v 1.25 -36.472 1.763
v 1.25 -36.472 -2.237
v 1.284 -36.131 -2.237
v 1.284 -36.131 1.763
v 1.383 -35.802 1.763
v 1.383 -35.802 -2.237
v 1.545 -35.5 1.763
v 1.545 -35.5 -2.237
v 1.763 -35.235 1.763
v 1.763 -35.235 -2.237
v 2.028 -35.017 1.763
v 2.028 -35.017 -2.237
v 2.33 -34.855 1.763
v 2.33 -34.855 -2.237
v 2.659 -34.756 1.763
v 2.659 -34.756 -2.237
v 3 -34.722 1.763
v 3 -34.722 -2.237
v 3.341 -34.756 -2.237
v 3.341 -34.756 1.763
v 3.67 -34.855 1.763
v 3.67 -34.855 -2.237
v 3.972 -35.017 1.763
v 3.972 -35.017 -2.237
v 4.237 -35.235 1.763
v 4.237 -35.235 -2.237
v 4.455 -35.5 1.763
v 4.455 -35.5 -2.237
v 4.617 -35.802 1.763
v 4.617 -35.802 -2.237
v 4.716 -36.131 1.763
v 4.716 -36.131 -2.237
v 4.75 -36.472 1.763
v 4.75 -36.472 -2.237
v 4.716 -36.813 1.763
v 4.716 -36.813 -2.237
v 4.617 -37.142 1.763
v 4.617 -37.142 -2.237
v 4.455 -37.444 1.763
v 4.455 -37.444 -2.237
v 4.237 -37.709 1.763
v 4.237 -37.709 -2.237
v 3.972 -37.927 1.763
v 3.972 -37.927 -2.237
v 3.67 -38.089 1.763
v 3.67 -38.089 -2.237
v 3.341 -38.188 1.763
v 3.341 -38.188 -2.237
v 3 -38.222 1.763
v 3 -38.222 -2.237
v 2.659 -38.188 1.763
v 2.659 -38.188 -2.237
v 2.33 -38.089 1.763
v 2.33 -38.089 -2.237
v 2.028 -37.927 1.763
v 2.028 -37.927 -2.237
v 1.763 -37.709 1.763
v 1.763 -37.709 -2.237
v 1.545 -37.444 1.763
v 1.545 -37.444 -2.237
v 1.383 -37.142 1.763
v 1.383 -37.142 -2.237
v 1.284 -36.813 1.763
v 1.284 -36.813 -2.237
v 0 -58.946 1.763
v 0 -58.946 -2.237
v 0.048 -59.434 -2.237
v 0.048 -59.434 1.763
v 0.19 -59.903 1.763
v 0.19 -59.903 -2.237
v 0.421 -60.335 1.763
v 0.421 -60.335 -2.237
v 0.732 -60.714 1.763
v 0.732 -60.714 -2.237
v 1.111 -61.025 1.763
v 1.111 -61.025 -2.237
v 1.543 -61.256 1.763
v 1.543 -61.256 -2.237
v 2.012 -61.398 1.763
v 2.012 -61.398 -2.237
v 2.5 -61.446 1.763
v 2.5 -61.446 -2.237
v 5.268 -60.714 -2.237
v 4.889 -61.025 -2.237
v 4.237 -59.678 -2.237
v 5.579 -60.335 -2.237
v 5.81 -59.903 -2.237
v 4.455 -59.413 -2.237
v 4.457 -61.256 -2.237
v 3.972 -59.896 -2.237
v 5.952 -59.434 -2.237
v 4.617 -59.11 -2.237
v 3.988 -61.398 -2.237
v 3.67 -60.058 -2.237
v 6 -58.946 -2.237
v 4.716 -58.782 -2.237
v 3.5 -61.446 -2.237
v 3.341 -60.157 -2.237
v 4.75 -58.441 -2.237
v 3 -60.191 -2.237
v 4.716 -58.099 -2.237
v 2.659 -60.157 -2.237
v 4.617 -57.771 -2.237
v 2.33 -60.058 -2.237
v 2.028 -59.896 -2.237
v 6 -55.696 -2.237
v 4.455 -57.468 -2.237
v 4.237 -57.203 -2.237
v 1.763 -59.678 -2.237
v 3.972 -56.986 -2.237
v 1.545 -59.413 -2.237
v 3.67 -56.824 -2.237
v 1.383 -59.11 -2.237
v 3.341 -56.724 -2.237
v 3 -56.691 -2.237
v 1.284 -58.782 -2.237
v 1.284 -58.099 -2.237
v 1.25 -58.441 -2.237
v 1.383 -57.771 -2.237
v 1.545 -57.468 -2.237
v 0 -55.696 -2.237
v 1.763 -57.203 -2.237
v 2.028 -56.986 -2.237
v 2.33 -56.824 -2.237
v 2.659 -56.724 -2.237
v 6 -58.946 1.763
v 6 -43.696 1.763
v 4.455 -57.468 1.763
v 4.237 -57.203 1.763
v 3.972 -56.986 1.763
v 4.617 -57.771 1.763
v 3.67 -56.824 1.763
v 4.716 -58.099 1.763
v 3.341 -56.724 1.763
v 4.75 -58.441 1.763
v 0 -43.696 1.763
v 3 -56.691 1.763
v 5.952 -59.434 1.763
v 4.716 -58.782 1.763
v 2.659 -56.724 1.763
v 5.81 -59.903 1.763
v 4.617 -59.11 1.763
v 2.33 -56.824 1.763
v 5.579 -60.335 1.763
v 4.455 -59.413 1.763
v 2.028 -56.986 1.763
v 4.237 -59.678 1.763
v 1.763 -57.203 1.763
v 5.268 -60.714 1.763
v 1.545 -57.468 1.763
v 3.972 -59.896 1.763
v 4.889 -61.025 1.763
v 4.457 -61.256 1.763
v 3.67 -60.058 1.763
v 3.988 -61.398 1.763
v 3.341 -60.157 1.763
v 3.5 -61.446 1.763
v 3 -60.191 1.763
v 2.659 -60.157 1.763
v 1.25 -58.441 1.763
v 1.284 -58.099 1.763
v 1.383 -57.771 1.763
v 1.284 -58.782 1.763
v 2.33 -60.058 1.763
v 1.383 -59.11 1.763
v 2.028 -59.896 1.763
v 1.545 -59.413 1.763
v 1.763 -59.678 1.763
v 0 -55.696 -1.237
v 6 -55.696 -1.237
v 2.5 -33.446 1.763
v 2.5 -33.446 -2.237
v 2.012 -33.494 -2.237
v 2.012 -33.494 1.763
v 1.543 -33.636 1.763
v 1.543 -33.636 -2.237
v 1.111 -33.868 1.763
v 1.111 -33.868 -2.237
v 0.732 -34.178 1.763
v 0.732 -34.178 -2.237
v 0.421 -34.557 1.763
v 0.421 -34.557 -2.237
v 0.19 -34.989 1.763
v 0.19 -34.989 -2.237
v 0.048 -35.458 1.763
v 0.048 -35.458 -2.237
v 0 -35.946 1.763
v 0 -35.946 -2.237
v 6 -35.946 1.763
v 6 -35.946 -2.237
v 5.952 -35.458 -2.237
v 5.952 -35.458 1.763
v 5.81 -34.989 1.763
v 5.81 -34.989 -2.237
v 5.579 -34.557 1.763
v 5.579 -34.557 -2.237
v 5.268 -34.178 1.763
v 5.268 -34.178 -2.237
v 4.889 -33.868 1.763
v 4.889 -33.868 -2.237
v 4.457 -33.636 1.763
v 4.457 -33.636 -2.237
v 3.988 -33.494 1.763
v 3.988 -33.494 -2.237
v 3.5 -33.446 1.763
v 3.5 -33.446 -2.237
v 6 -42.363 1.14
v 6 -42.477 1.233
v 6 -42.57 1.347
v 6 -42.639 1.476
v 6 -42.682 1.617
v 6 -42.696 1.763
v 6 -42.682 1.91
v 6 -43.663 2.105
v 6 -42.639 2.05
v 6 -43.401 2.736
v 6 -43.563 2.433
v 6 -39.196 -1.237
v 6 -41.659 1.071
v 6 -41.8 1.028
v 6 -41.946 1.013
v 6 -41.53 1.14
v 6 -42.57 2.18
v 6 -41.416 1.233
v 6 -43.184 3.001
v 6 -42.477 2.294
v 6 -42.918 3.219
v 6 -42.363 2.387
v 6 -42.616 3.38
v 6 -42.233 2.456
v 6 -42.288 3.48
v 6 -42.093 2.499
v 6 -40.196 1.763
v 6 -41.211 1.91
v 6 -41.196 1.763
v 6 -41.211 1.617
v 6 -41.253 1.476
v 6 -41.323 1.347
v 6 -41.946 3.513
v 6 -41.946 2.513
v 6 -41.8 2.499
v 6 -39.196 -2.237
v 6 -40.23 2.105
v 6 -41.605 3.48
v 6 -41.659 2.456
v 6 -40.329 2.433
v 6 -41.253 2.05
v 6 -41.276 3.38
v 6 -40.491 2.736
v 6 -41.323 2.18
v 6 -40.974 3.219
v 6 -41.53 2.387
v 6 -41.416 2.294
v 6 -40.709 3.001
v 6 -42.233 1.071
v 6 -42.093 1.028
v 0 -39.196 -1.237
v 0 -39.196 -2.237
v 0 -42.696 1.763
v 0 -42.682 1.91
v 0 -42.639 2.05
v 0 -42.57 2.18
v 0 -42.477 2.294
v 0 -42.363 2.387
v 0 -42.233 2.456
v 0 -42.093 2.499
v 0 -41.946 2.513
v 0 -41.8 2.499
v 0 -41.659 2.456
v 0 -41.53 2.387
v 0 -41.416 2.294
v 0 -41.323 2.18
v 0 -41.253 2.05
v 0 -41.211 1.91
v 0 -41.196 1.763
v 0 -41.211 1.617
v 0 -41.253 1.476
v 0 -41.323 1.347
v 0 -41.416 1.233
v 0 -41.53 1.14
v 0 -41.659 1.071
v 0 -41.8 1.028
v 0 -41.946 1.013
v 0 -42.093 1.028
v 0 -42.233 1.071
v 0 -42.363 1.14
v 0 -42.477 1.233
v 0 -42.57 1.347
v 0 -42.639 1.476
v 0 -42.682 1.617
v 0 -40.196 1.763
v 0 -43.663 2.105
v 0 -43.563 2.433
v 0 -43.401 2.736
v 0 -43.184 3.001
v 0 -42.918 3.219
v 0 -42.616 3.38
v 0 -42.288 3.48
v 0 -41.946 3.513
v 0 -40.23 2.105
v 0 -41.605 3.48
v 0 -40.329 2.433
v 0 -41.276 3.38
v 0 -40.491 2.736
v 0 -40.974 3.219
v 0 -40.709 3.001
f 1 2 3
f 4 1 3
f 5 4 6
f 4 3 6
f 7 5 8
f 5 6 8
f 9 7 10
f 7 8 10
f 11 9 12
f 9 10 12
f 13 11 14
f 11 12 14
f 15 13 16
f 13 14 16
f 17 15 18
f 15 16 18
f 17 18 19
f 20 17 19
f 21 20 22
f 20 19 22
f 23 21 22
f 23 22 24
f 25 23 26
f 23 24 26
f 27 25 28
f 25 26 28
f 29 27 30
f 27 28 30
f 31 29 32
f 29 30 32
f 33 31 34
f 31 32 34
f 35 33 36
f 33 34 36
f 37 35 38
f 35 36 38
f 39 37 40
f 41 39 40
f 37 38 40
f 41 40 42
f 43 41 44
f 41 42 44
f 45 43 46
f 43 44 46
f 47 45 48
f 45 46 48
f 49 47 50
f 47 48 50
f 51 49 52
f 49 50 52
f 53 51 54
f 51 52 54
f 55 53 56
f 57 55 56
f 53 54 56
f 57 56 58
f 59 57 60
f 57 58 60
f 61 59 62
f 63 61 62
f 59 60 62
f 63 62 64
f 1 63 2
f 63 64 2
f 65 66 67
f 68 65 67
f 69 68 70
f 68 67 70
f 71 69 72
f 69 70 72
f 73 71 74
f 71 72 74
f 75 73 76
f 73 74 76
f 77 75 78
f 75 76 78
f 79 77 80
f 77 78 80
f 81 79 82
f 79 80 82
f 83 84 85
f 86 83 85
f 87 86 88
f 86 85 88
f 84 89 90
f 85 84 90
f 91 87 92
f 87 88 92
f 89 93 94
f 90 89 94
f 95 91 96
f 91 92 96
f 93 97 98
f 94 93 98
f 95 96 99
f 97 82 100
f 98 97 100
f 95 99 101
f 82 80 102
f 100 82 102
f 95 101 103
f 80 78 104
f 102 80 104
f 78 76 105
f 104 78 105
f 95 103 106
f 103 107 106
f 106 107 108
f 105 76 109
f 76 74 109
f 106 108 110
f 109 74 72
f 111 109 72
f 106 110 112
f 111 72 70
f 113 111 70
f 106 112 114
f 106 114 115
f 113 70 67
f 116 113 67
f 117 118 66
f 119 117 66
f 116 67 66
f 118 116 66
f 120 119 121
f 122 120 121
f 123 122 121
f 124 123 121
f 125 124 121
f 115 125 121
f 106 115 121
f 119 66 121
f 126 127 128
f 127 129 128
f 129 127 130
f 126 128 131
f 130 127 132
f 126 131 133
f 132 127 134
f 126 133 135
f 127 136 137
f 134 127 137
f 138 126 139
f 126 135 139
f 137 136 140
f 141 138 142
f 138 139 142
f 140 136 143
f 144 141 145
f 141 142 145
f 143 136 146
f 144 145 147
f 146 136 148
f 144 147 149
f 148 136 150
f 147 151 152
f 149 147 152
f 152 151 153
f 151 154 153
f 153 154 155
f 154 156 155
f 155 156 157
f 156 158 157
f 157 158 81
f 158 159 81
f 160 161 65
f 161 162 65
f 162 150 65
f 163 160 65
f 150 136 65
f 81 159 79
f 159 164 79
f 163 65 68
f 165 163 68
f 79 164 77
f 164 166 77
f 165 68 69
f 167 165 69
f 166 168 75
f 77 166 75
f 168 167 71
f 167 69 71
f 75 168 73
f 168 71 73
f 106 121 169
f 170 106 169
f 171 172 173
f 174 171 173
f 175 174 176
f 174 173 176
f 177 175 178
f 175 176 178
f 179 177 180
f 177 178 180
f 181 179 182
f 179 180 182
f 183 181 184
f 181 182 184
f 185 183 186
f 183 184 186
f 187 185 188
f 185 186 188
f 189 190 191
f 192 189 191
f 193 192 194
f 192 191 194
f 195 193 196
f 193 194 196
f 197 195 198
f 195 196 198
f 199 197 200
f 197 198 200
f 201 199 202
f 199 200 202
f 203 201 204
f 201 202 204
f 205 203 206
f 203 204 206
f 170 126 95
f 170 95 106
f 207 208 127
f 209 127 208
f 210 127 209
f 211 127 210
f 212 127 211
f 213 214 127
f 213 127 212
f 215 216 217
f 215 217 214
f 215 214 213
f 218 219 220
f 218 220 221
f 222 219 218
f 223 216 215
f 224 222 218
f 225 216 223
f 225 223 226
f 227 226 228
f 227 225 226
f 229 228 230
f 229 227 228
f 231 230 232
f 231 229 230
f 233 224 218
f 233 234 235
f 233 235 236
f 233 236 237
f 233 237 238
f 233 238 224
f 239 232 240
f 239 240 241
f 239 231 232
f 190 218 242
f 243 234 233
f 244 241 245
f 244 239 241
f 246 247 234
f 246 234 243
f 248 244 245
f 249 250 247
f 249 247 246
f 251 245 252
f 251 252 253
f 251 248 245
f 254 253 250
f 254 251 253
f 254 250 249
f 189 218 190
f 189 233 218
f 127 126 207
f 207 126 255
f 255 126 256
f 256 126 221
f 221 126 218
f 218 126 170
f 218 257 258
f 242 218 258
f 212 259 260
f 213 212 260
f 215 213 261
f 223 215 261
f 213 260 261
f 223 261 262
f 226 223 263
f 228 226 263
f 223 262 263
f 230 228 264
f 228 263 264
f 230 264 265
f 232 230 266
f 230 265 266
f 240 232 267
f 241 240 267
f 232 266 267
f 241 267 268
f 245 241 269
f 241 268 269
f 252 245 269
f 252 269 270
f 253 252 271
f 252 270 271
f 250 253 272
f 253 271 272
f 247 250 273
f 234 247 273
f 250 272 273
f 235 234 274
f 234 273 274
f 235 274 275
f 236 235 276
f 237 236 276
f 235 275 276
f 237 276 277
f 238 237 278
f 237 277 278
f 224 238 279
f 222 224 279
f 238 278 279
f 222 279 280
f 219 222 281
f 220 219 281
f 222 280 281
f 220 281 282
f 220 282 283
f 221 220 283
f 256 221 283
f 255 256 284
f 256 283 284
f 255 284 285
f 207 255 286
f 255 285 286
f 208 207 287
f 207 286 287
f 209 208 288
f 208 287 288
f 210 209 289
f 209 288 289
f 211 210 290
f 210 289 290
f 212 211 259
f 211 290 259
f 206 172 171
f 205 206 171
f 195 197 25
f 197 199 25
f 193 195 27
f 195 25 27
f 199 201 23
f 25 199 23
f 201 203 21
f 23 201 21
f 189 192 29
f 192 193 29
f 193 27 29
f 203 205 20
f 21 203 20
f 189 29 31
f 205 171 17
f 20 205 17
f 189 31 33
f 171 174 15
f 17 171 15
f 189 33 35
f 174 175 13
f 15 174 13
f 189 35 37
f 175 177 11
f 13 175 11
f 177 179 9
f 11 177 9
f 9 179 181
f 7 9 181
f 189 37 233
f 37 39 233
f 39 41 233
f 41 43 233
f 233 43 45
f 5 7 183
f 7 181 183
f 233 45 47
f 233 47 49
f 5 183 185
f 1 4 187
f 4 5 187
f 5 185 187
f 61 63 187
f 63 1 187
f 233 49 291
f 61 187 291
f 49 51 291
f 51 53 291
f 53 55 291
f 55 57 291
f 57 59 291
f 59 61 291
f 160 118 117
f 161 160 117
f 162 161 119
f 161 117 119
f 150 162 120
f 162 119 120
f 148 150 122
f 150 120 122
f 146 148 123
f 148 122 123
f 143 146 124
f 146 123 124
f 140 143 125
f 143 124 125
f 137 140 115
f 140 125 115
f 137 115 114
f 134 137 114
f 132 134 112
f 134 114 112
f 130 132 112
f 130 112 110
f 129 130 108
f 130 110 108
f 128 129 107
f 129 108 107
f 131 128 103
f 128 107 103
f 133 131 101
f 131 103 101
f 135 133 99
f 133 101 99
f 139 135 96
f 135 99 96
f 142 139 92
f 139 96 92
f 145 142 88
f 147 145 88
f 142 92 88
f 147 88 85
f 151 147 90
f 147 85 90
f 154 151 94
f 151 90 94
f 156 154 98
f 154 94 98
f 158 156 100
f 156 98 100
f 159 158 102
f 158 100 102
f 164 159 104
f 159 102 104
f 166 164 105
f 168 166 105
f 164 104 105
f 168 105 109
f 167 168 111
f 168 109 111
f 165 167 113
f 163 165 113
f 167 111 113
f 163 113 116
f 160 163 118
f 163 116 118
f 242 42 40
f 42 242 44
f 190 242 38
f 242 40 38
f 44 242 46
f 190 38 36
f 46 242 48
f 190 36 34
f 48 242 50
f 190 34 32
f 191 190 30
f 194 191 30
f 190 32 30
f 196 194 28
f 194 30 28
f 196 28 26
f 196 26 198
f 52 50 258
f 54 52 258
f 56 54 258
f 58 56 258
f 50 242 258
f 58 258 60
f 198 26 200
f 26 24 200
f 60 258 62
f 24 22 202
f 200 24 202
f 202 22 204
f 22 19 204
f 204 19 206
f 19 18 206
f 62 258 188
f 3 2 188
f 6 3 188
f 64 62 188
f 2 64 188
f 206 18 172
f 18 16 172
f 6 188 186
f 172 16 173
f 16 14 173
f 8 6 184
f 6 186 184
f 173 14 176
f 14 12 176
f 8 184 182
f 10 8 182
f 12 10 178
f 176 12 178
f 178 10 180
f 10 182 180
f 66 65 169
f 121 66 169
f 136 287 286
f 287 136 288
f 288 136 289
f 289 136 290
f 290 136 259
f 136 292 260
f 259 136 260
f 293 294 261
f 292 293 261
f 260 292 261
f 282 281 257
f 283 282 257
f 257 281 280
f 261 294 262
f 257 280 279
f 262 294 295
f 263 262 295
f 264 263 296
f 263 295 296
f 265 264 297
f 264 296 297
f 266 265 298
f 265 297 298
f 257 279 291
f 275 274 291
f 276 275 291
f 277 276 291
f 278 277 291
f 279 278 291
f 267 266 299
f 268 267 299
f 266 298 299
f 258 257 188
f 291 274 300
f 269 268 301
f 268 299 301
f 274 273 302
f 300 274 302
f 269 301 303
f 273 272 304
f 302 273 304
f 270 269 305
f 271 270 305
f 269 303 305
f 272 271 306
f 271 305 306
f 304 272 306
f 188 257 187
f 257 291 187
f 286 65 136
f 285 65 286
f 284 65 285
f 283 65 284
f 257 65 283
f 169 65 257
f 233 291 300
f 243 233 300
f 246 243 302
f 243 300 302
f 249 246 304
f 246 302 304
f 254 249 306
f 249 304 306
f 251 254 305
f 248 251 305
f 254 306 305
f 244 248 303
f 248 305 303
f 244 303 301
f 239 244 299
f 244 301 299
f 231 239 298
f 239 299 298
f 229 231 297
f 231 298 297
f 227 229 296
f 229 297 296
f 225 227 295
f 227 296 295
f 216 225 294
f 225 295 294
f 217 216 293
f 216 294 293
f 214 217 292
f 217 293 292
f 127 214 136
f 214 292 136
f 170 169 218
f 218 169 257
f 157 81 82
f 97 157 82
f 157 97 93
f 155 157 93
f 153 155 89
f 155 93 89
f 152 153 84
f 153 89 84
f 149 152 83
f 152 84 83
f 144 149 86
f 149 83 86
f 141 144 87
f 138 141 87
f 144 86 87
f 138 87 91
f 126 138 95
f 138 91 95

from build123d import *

# Parameters (mm, degrees)
F0_W     = 1.25
F0_H     = 4
F0_W_2   = 1.75
F1_DEPTH = 6
F4_DEPTH = 4
F5_DEPTH = 4
F6_DEPTH = 4


# Not quite as in the source:
# - a feature names something its author has since deleted; it is built from what else it names


with BuildPart() as f1:
    # F0 (on Right) → F1 (new body)
    with BuildSketch(Plane.YZ):
        with Locations((-34.0711950026, -0.2365471814)):
            Rectangle(F0_W, F0_H)
        with Locations((-35.5711950026, -0.2365471814)):
            Rectangle(F0_W_2, F0_H)
        with BuildLine():
            Line((-38.1961950026, -2.2365471814), (-36.4461950026, -2.2365471814))
            Line((-36.4461950026, -2.2365471814), (-36.4461950026, 1.7634528186))
            Line((-36.4461950026, 1.7634528186), (-38.1961950026, 1.7634528186))
            Line((-38.1961950026, 1.7634528186), (-40.1961950026, 1.7634528186))
            ThreePointArc((-40.1961950026, 1.7634528186), (-41.9461950026, 0.0134528186), (-43.6961950026, 1.7634528186))
            Line((-43.6961950026, 1.7634528186), (-56.6961950026, 1.7634528186))
            Line((-56.6961950026, 1.7634528186), (-56.6961950026, -1.4865471814))
            Line((-56.6961950026, -1.4865471814), (-56.6961950026, -2.2365471814))
            Line((-56.6961950026, -2.2365471814), (-55.6961950026, -2.2365471814))
            Line((-55.6961950026, -2.2365471814), (-55.6961950026, -1.2365471814))
            Line((-55.6961950026, -1.2365471814), (-39.1961950026, -1.2365471814))
            Line((-39.1961950026, -1.2365471814), (-39.1961950026, -2.2365471814))
            Line((-39.1961950026, -2.2365471814), (-38.1961950026, -2.2365471814))
        make_face()
        with BuildLine():
            ThreePointArc((-43.6961950026, 1.7634528186), (-41.9461950026, 0.0134528186), (-40.1961950026, 1.7634528186))
            Line((-40.1961950026, 1.7634528186), (-41.1961950026, 1.7634528186))
            ThreePointArc((-41.1961950026, 1.7634528186), (-41.9461950026, 1.0134528186), (-42.6961950026, 1.7634528186))
            Line((-42.6961950026, 1.7634528186), (-43.6961950026, 1.7634528186))
        make_face()
        with BuildLine():
            Line((-41.1961950026, 1.7634528186), (-40.1961950026, 1.7634528186))
            ThreePointArc((-40.1961950026, 1.7634528186), (-41.9461950026, 3.5134528186), (-43.6961950026, 1.7634528186))
            Line((-43.6961950026, 1.7634528186), (-42.6961950026, 1.7634528186))
            ThreePointArc((-42.6961950026, 1.7634528186), (-41.9461950026, 2.5134528186), (-41.1961950026, 1.7634528186))
        make_face()
        Polygon((-56.6961950026, -1.4865471814), (-56.6961950026, 1.7634528186), (-58.4461950026, 1.7634528186), (-58.4461950026, -2.2365471814), (-56.6961950026, -2.2365471814), align=None)
        with Locations((-59.3211950026, -0.2365471814)):
            Rectangle(F0_W_2, F0_H)
        Polygon((-60.1961950026, -2.2365471814), (-60.1961950026, 1.7634528186), (-61.4461950026, 1.7634528186), (-61.4461950026, -0.2365471814), (-61.4461950026, -2.2365471814), align=None)
    extrude(amount=F1_DEPTH)

    # F2 (on face) → F4 (cut)
    with BuildSketch(Plane(origin=(0, 0, -2.2365471814), x_dir=(1, 0, 0), z_dir=(0, 0, -1))):
        with BuildLine():
            Line((0, 61.4461950026), (0, 58.9461950026))
            ThreePointArc((0, 58.9461950026), (0.732233047, 60.7139619556), (2.5, 61.4461950026))
            Line((2.5, 61.4461950026), (0, 61.4461950026))
        make_face()
        with BuildLine():
            ThreePointArc((3.5, 61.4461950026), (5.267766953, 60.7139619556), (6, 58.9461950026))
            Line((6, 58.9461950026), (6, 61.4461950026))
            Line((6, 61.4461950026), (3.5, 61.4461950026))
        make_face()
    extrude(amount=-F4_DEPTH, mode=Mode.SUBTRACT)

    # F2 (on face) → F5 (cut)
    with BuildSketch(Plane(origin=(0, 0, -2.2365471814), x_dir=(1, 0, 0), z_dir=(0, 0, -1))):
        with BuildLine():
            Line((1.25, 58.4407150745), (4.75, 58.4407150745))
            ThreePointArc((4.75, 58.4407150745), (3, 60.1907150745), (1.25, 58.4407150745))
        make_face()
        with BuildLine():
            ThreePointArc((1.25, 58.4407150745), (3, 56.6907150745), (4.75, 58.4407150745))
            Line((4.75, 58.4407150745), (1.25, 58.4407150745))
        make_face()
    extrude(amount=-F5_DEPTH, mode=Mode.SUBTRACT)

    # F3 (on face) → F6 (cut)
    with BuildSketch(Plane(origin=(0, 0, -2.2365471814), x_dir=(1, 0, 0), z_dir=(0, 0, -1))):
        with BuildLine():
            Line((1.25, 36.4720486104), (4.75, 36.4720486104))
            ThreePointArc((4.75, 36.4720486104), (3, 38.2220486104), (1.25, 36.4720486104))
        make_face()
        with BuildLine():
            Line((6, 33.4461950026), (6, 35.9461950026))
            ThreePointArc((6, 35.9461950026), (5.267766953, 34.1784280497), (3.5, 33.4461950026))
            Line((3.5, 33.4461950026), (6, 33.4461950026))
        make_face()
        with BuildLine():
            ThreePointArc((2.5, 33.4461950026), (0.732233047, 34.1784280497), (0, 35.9461950026))
            Line((0, 35.9461950026), (0, 33.4461950026))
            Line((0, 33.4461950026), (2.5, 33.4461950026))
        make_face()
        with BuildLine():
            ThreePointArc((1.25, 36.4720486104), (3, 34.7220486104), (4.75, 36.4720486104))
            Line((4.75, 36.4720486104), (1.25, 36.4720486104))
        make_face()
    extrude(amount=-F6_DEPTH, mode=Mode.SUBTRACT)


solid = f1.part
